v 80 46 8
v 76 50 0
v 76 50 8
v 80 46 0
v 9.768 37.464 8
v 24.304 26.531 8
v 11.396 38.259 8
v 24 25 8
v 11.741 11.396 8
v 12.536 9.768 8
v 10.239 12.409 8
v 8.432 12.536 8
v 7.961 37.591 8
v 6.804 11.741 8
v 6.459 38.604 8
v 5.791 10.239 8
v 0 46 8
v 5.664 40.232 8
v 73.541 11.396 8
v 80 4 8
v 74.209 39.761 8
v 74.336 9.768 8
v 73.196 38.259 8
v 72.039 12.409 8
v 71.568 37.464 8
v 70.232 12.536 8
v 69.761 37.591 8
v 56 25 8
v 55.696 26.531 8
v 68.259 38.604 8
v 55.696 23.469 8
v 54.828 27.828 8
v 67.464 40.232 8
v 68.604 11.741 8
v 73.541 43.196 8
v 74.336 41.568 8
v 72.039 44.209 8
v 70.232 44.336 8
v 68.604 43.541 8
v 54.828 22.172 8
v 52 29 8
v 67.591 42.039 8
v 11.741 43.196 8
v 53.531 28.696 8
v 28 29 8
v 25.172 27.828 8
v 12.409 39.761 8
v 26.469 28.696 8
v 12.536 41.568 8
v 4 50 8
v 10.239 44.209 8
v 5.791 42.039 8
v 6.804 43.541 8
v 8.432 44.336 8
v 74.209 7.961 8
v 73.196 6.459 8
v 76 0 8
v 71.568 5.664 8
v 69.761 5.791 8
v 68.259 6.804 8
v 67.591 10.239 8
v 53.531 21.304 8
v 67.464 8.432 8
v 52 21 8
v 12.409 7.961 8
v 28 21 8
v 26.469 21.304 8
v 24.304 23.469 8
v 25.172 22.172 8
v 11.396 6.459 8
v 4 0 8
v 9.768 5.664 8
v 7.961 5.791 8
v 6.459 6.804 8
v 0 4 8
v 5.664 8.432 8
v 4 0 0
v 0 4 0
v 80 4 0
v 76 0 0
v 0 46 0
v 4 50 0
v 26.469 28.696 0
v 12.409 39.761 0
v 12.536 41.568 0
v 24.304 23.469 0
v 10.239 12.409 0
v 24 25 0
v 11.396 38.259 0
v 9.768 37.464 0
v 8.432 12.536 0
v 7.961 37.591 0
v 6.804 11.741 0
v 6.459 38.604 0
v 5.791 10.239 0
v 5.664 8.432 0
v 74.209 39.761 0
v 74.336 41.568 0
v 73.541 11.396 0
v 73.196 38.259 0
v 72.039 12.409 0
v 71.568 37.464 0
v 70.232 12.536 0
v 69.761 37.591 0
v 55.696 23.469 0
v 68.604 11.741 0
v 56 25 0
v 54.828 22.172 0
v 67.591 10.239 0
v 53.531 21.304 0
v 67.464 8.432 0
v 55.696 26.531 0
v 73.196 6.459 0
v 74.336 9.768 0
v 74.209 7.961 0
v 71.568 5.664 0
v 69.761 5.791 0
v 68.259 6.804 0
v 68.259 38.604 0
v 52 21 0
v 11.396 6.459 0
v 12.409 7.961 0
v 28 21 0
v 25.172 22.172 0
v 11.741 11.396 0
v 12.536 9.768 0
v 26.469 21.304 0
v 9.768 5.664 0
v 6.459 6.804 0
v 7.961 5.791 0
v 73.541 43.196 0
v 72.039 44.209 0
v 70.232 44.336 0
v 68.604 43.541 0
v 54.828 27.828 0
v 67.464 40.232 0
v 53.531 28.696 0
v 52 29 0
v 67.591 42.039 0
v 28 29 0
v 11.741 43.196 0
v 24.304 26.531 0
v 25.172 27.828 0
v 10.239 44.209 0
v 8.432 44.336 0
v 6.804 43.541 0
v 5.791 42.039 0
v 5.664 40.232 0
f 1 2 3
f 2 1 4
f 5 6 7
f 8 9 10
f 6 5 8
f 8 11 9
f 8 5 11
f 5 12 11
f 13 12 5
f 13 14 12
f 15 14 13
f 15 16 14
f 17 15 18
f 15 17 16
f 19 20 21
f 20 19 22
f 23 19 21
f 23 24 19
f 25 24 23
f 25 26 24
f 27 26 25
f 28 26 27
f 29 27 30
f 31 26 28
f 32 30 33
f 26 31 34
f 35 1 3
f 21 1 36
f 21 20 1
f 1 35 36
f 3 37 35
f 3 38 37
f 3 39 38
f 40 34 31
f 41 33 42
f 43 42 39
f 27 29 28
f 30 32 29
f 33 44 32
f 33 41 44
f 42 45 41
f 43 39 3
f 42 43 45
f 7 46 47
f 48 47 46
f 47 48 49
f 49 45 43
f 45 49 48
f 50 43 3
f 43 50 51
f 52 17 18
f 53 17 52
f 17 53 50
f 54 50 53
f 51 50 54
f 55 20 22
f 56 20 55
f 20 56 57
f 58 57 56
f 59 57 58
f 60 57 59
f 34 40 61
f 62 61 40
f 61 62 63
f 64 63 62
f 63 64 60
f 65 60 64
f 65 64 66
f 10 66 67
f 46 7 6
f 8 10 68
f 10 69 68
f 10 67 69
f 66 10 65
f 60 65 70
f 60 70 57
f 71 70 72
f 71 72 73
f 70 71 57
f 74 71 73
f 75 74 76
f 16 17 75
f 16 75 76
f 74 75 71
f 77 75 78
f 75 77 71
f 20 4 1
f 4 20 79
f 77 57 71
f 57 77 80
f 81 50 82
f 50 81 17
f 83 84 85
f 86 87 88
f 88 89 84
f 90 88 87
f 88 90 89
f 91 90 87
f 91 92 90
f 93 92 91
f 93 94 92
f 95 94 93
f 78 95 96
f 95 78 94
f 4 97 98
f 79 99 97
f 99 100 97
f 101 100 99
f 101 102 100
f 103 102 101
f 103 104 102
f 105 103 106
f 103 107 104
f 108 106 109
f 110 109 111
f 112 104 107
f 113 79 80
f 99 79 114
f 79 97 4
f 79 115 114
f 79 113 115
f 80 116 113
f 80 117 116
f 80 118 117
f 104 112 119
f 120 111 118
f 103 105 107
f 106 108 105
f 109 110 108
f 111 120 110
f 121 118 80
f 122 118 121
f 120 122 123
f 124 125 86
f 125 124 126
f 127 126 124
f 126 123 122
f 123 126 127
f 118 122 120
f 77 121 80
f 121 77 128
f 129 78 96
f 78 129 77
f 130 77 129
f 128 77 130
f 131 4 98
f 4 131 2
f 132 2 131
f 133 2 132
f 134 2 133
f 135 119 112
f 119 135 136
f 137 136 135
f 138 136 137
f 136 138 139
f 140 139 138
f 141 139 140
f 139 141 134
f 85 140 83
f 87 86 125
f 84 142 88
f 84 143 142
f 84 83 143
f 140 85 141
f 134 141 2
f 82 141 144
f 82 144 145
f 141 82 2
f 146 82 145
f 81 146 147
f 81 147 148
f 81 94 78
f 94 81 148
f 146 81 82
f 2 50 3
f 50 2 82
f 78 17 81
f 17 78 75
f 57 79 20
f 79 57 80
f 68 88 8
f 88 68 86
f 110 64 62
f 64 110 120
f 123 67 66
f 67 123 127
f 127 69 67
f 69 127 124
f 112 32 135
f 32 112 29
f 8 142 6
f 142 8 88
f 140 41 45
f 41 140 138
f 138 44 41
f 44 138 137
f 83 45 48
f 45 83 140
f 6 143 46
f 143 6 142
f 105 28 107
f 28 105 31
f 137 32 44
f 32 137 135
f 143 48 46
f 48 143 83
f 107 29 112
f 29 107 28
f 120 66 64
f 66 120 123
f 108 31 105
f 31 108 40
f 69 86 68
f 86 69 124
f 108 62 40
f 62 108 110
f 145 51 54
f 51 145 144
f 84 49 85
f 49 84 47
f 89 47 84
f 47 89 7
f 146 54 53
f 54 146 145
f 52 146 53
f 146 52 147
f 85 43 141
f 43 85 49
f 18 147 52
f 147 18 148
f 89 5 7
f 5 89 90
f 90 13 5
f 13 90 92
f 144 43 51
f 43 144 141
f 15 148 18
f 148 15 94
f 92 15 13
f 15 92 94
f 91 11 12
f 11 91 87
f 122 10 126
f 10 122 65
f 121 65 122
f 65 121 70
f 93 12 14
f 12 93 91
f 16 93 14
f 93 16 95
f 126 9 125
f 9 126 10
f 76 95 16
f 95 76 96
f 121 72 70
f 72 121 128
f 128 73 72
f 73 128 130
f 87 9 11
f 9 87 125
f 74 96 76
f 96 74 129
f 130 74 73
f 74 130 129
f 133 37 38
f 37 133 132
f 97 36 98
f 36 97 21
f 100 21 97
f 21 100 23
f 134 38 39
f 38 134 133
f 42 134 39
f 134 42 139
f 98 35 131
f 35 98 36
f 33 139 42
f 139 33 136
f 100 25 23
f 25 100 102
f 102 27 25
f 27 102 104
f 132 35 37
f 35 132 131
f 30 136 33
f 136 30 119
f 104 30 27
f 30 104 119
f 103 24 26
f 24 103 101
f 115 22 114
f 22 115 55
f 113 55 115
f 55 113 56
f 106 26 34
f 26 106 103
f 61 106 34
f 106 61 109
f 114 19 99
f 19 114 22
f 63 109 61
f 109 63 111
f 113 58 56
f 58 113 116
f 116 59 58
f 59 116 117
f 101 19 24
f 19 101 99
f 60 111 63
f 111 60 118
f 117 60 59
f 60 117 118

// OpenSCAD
$fn = 32;

// ----------------------------------------------------------------------
// Bracket plate: slot plate 80 x 50
// ----------------------------------------------------------------------

// --- parameters (mm) ---
hole_r = 3.5;             // bolt hole radius
plate_t = 8;              // plate thickness, Z (extrusion height)
plate_l = 80;             // plate length
plate_w = 50;             // plate width
slot_l = 24;              // slot straight length
slot_r = 4;               // slot end radius

slot_len = slot_l + 2 * slot_r;
slot_w = 2 * slot_r;
hole_d2 = 2 * hole_r;

profile = [[4, 0], [76, 0], [80, 4], [80, 46], [76, 50], [4, 50], [0, 46], [0, 4]];  // primary outline, 8 points, counter clockwise
void_1 = [[52, 21], [53.531, 21.304], [54.828, 22.172], [55.696, 23.469], [56, 25], [55.696, 26.531], [54.828, 27.828], [53.531, 28.696], [52, 29], [28, 29], [26.469, 28.696], [25.172, 27.828], [24.304, 26.531], [24, 25], [24.304, 23.469], [25.172, 22.172], [26.469, 21.304], [28, 21]];  // grip slot, 18 points
void_2 = [[12.536, 41.568], [11.741, 43.196], [10.239, 44.209], [8.432, 44.336], [6.804, 43.541], [5.791, 42.039], [5.664, 40.232], [6.459, 38.604], [7.961, 37.591], [9.768, 37.464], [11.396, 38.259], [12.409, 39.761]];  // corner hole, 12 points
void_3 = [[12.536, 9.768], [11.741, 11.396], [10.239, 12.409], [8.432, 12.536], [6.804, 11.741], [5.791, 10.239], [5.664, 8.432], [6.459, 6.804], [7.961, 5.791], [9.768, 5.664], [11.396, 6.459], [12.409, 7.961]];  // corner hole, 12 points
void_4 = [[74.336, 41.568], [73.541, 43.196], [72.039, 44.209], [70.232, 44.336], [68.604, 43.541], [67.591, 42.039], [67.464, 40.232], [68.259, 38.604], [69.761, 37.591], [71.568, 37.464], [73.196, 38.259], [74.209, 39.761]];  // corner hole, 12 points
void_5 = [[74.336, 9.768], [73.541, 11.396], [72.039, 12.409], [70.232, 12.536], [68.604, 11.741], [67.591, 10.239], [67.464, 8.432], [68.259, 6.804], [69.761, 5.791], [71.568, 5.664], [73.196, 6.459], [74.209, 7.961]];  // corner hole, 12 points

// --- the one profile operation ---
difference() {
  linear_extrude(height = plate_t) polygon(points = profile);
  translate([0, 0, -1])
    linear_extrude(height = plate_t + 2) polygon(points = void_1);
  translate([0, 0, -1])
    linear_extrude(height = plate_t + 2) polygon(points = void_2);
  translate([0, 0, -1])
    linear_extrude(height = plate_t + 2) polygon(points = void_3);
  translate([0, 0, -1])
    linear_extrude(height = plate_t + 2) polygon(points = void_4);
  translate([0, 0, -1])
    linear_extrude(height = plate_t + 2) polygon(points = void_5);
}
